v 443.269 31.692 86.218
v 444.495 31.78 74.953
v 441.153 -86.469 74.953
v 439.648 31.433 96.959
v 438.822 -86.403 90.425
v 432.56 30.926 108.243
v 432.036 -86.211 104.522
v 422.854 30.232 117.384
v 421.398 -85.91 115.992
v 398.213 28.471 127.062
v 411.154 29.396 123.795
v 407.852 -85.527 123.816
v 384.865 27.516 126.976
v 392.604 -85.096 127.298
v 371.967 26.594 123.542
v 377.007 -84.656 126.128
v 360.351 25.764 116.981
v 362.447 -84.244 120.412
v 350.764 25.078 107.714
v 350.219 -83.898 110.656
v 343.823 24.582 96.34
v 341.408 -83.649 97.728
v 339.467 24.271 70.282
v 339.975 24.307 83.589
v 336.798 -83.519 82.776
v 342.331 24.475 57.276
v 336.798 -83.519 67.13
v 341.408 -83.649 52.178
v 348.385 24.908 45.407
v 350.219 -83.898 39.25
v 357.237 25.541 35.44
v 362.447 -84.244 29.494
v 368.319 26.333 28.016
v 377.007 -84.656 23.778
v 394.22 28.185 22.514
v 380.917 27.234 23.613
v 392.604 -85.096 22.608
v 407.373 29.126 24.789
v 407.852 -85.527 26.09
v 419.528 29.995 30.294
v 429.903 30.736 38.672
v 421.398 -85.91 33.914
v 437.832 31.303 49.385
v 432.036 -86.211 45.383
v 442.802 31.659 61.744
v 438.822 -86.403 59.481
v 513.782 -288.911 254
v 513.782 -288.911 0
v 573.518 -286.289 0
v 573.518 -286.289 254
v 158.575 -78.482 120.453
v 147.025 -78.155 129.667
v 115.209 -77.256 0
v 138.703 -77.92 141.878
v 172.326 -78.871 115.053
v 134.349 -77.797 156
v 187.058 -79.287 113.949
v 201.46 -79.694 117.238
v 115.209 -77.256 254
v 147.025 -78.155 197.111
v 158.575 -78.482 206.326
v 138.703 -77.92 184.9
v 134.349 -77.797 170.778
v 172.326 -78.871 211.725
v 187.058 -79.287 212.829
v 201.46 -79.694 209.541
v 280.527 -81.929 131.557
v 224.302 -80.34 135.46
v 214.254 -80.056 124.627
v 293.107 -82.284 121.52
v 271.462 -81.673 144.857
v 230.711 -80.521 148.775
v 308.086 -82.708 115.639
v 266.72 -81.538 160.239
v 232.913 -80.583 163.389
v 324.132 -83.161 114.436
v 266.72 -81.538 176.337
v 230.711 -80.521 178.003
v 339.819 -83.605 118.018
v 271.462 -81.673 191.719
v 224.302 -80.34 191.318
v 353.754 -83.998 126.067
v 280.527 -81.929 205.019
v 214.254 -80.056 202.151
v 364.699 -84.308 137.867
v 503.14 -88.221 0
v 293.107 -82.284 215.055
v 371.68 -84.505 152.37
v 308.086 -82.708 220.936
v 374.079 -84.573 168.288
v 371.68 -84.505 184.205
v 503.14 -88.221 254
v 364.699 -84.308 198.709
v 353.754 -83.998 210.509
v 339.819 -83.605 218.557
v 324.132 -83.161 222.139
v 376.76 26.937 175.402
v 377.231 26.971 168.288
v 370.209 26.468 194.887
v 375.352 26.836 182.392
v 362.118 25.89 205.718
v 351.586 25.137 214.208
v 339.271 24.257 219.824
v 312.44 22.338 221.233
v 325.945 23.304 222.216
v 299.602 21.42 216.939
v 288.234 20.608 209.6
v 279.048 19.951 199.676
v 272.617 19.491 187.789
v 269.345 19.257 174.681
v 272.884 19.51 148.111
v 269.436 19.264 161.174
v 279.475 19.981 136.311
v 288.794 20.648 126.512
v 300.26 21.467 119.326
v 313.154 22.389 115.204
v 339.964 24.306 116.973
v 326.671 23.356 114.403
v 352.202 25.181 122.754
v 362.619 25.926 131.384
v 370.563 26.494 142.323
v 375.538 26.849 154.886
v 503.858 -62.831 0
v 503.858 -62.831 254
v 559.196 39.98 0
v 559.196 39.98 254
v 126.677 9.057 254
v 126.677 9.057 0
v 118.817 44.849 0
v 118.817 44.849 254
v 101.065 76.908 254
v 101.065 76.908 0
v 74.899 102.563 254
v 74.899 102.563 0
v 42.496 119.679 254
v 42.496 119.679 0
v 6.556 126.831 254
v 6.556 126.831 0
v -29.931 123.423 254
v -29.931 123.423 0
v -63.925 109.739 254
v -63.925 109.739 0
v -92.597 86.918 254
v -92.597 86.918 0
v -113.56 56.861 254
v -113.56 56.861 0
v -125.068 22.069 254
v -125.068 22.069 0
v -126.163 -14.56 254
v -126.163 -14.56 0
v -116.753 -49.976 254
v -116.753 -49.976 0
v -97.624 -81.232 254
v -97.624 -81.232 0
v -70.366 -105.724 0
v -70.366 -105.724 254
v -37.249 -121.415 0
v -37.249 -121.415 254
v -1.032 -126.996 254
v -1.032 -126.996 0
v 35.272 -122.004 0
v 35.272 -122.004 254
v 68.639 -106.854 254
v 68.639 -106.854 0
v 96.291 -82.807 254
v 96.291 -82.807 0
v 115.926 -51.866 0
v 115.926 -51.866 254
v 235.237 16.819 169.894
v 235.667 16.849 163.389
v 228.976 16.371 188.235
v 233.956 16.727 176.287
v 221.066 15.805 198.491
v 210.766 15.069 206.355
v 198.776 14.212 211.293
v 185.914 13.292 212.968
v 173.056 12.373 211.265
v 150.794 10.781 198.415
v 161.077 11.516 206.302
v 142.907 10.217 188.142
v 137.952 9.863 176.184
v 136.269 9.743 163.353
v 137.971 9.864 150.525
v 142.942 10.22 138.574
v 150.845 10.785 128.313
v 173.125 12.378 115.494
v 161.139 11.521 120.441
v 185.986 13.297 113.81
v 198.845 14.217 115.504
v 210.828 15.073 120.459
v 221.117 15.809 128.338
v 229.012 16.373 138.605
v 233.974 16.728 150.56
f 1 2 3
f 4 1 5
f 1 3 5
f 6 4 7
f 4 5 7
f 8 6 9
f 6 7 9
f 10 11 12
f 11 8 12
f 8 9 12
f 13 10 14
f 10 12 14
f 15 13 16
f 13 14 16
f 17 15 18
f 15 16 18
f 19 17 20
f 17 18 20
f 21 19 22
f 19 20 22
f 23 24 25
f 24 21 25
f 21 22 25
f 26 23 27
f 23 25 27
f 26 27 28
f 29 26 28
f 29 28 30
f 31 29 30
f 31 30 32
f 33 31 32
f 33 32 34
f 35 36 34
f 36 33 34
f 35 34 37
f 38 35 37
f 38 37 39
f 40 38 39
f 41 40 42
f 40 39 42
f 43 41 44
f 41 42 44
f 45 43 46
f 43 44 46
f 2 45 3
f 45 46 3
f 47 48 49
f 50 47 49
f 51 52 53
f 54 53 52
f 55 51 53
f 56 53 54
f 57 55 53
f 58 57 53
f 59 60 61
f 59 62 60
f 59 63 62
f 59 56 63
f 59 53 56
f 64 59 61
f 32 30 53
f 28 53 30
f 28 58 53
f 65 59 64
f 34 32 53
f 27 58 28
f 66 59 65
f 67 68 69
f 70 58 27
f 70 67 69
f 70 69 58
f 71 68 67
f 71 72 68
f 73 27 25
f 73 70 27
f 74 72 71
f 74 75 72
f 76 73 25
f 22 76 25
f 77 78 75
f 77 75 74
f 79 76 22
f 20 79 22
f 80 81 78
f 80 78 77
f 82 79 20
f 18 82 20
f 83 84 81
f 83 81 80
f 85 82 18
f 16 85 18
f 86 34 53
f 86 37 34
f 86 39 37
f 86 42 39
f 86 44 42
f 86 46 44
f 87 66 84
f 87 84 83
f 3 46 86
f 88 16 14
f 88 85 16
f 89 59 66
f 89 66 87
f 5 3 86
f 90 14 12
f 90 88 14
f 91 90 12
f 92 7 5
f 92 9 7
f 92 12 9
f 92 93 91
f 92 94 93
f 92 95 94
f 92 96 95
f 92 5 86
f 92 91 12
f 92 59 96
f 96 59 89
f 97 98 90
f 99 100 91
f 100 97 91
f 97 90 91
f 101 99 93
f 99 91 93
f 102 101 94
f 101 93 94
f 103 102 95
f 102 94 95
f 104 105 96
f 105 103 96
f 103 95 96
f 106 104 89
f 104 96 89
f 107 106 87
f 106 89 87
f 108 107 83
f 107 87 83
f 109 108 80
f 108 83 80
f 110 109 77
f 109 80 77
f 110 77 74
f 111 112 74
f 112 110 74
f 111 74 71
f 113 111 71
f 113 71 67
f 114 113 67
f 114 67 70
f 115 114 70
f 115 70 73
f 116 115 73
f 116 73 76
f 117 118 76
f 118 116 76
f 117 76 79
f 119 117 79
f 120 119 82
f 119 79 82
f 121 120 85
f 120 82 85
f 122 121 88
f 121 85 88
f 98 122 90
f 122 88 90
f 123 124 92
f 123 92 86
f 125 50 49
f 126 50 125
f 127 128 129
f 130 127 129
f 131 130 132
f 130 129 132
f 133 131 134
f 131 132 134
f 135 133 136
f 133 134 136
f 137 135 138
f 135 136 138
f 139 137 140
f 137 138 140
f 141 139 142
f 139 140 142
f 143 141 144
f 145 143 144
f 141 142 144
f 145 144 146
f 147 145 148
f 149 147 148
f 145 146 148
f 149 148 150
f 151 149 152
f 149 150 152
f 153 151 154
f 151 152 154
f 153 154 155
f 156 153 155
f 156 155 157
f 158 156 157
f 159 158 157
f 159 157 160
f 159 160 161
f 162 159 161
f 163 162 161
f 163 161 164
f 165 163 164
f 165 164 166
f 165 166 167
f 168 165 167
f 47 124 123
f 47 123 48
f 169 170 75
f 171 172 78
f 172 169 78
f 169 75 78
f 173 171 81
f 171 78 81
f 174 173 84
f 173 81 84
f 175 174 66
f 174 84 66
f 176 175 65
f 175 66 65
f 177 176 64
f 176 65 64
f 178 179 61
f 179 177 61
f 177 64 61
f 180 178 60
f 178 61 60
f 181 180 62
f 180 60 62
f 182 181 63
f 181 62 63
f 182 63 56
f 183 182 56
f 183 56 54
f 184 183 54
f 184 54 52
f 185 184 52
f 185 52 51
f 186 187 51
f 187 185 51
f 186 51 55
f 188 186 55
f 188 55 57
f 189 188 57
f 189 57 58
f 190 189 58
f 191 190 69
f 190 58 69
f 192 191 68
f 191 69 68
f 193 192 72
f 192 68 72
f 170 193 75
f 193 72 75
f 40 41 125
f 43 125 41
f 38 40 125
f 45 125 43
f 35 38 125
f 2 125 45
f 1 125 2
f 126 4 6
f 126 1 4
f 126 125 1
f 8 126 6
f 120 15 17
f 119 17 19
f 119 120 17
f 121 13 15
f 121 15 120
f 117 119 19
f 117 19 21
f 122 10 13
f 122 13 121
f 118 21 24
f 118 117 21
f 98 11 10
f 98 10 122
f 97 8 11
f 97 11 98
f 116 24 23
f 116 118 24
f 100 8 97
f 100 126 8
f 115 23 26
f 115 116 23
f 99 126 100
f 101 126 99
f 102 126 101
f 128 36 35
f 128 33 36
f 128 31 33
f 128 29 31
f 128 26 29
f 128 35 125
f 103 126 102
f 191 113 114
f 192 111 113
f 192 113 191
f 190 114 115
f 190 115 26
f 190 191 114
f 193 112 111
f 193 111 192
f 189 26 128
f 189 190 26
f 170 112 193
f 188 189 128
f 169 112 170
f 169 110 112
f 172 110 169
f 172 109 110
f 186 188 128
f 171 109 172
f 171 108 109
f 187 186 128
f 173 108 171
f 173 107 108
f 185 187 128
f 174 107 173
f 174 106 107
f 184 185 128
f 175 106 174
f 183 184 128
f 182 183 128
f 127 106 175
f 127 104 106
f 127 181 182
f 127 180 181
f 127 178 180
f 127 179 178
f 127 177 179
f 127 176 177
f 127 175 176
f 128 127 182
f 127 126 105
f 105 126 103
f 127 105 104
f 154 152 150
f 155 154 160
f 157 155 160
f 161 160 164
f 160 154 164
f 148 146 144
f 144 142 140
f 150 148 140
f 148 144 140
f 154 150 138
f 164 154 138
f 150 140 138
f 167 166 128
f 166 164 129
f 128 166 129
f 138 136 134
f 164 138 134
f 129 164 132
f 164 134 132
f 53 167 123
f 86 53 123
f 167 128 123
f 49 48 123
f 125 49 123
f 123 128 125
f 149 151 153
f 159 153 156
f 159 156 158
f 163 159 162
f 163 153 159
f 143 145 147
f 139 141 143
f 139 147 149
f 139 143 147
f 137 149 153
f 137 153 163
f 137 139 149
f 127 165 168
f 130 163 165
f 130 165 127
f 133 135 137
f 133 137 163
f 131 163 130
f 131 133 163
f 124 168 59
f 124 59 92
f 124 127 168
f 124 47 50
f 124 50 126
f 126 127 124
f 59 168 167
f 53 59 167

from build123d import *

# Parameters (mm, degrees)
F0_R      = 127
F1_DEPTH  = 254
F3_DEPTH  = 254
F4_DEPTH  = 25.4
F5_R      = 49.5787296889
F6_DEPTH  = 210.82
F7_R      = 54.002568176
F8_DEPTH  = 254
F9_R      = 52.4914497997
F10_DEPTH = 254


with BuildPart() as f1:
    # F0 (on Top) → F1 (new body)
    with BuildSketch(Plane.XY):
        Circle(F0_R)
    extrude(amount=F1_DEPTH)

    # F2 (on face) → F3 (join)
    with BuildSketch(Plane.XY.offset(254)):
        with BuildLine():
            Line((559.1962337494, 39.9803072214), (126.6766473602, 9.056876591))
            ThreePointArc((126.6766473602, 9.056876591), (126.9191360961, 4.5313234964), (127, 0))
            ThreePointArc((127, 0), (124.2007035095, -26.5176403124), (115.9262165711, -51.8662926332))
            Line((115.9262165711, -51.8662926332), (503.8578976831, -62.8307757108))
            Line((503.8578976831, -62.8307757108), (513.781719797, -288.9111098311))
            Line((513.781719797, -288.9111098311), (573.5178616361, -286.2889850555))
            Line((573.5178616361, -286.2889850555), (559.1962337494, 39.9803072214))
        make_face()
    extrude(amount=-F3_DEPTH)

    # F4 (add): a face of the model
    f4_faces = [f1.faces().sort_by_distance(p)[0] for p in [
        (309.8920571271, -57.348534172, 127),
    ]]
    extrude(f4_faces, amount=F4_DEPTH)

    # F5 (on face) → F6 (cut)
    with BuildSketch(Plane(origin=(-2.08986034, -73.9408350817, 0), x_dir=(0.9996008136, -0.0282526711, 0), z_dir=(-0.0282526711, -0.9996008136, 0))):
        with Locations((185.5181306601, 163.3890718222)):
            Circle(F5_R)
    extrude(amount=-F6_DEPTH, mode=Mode.SUBTRACT)

    # F7 (on face) → F8 (cut)
    with BuildSketch(Plane(origin=(-2.08986034, -73.9408350817, 0), x_dir=(0.9996008136, -0.0282526711, 0), z_dir=(-0.0282526711, -0.9996008136, 0))):
        with Locations((322.3161399364, 168.2878434658)):
            Circle(F7_R)
    extrude(amount=-F8_DEPTH, mode=Mode.SUBTRACT)

    # F9 (on face) → F10 (cut)
    with BuildSketch(Plane(origin=(-2.08986034, -73.9408350817, 0), x_dir=(0.9996008136, -0.0282526711, 0), z_dir=(-0.0282526711, -0.9996008136, 0))):
        with Locations((390.9286558628, 74.9529749155)):
            Circle(F9_R)
    extrude(amount=-F10_DEPTH, mode=Mode.SUBTRACT)


solid = f1.part
